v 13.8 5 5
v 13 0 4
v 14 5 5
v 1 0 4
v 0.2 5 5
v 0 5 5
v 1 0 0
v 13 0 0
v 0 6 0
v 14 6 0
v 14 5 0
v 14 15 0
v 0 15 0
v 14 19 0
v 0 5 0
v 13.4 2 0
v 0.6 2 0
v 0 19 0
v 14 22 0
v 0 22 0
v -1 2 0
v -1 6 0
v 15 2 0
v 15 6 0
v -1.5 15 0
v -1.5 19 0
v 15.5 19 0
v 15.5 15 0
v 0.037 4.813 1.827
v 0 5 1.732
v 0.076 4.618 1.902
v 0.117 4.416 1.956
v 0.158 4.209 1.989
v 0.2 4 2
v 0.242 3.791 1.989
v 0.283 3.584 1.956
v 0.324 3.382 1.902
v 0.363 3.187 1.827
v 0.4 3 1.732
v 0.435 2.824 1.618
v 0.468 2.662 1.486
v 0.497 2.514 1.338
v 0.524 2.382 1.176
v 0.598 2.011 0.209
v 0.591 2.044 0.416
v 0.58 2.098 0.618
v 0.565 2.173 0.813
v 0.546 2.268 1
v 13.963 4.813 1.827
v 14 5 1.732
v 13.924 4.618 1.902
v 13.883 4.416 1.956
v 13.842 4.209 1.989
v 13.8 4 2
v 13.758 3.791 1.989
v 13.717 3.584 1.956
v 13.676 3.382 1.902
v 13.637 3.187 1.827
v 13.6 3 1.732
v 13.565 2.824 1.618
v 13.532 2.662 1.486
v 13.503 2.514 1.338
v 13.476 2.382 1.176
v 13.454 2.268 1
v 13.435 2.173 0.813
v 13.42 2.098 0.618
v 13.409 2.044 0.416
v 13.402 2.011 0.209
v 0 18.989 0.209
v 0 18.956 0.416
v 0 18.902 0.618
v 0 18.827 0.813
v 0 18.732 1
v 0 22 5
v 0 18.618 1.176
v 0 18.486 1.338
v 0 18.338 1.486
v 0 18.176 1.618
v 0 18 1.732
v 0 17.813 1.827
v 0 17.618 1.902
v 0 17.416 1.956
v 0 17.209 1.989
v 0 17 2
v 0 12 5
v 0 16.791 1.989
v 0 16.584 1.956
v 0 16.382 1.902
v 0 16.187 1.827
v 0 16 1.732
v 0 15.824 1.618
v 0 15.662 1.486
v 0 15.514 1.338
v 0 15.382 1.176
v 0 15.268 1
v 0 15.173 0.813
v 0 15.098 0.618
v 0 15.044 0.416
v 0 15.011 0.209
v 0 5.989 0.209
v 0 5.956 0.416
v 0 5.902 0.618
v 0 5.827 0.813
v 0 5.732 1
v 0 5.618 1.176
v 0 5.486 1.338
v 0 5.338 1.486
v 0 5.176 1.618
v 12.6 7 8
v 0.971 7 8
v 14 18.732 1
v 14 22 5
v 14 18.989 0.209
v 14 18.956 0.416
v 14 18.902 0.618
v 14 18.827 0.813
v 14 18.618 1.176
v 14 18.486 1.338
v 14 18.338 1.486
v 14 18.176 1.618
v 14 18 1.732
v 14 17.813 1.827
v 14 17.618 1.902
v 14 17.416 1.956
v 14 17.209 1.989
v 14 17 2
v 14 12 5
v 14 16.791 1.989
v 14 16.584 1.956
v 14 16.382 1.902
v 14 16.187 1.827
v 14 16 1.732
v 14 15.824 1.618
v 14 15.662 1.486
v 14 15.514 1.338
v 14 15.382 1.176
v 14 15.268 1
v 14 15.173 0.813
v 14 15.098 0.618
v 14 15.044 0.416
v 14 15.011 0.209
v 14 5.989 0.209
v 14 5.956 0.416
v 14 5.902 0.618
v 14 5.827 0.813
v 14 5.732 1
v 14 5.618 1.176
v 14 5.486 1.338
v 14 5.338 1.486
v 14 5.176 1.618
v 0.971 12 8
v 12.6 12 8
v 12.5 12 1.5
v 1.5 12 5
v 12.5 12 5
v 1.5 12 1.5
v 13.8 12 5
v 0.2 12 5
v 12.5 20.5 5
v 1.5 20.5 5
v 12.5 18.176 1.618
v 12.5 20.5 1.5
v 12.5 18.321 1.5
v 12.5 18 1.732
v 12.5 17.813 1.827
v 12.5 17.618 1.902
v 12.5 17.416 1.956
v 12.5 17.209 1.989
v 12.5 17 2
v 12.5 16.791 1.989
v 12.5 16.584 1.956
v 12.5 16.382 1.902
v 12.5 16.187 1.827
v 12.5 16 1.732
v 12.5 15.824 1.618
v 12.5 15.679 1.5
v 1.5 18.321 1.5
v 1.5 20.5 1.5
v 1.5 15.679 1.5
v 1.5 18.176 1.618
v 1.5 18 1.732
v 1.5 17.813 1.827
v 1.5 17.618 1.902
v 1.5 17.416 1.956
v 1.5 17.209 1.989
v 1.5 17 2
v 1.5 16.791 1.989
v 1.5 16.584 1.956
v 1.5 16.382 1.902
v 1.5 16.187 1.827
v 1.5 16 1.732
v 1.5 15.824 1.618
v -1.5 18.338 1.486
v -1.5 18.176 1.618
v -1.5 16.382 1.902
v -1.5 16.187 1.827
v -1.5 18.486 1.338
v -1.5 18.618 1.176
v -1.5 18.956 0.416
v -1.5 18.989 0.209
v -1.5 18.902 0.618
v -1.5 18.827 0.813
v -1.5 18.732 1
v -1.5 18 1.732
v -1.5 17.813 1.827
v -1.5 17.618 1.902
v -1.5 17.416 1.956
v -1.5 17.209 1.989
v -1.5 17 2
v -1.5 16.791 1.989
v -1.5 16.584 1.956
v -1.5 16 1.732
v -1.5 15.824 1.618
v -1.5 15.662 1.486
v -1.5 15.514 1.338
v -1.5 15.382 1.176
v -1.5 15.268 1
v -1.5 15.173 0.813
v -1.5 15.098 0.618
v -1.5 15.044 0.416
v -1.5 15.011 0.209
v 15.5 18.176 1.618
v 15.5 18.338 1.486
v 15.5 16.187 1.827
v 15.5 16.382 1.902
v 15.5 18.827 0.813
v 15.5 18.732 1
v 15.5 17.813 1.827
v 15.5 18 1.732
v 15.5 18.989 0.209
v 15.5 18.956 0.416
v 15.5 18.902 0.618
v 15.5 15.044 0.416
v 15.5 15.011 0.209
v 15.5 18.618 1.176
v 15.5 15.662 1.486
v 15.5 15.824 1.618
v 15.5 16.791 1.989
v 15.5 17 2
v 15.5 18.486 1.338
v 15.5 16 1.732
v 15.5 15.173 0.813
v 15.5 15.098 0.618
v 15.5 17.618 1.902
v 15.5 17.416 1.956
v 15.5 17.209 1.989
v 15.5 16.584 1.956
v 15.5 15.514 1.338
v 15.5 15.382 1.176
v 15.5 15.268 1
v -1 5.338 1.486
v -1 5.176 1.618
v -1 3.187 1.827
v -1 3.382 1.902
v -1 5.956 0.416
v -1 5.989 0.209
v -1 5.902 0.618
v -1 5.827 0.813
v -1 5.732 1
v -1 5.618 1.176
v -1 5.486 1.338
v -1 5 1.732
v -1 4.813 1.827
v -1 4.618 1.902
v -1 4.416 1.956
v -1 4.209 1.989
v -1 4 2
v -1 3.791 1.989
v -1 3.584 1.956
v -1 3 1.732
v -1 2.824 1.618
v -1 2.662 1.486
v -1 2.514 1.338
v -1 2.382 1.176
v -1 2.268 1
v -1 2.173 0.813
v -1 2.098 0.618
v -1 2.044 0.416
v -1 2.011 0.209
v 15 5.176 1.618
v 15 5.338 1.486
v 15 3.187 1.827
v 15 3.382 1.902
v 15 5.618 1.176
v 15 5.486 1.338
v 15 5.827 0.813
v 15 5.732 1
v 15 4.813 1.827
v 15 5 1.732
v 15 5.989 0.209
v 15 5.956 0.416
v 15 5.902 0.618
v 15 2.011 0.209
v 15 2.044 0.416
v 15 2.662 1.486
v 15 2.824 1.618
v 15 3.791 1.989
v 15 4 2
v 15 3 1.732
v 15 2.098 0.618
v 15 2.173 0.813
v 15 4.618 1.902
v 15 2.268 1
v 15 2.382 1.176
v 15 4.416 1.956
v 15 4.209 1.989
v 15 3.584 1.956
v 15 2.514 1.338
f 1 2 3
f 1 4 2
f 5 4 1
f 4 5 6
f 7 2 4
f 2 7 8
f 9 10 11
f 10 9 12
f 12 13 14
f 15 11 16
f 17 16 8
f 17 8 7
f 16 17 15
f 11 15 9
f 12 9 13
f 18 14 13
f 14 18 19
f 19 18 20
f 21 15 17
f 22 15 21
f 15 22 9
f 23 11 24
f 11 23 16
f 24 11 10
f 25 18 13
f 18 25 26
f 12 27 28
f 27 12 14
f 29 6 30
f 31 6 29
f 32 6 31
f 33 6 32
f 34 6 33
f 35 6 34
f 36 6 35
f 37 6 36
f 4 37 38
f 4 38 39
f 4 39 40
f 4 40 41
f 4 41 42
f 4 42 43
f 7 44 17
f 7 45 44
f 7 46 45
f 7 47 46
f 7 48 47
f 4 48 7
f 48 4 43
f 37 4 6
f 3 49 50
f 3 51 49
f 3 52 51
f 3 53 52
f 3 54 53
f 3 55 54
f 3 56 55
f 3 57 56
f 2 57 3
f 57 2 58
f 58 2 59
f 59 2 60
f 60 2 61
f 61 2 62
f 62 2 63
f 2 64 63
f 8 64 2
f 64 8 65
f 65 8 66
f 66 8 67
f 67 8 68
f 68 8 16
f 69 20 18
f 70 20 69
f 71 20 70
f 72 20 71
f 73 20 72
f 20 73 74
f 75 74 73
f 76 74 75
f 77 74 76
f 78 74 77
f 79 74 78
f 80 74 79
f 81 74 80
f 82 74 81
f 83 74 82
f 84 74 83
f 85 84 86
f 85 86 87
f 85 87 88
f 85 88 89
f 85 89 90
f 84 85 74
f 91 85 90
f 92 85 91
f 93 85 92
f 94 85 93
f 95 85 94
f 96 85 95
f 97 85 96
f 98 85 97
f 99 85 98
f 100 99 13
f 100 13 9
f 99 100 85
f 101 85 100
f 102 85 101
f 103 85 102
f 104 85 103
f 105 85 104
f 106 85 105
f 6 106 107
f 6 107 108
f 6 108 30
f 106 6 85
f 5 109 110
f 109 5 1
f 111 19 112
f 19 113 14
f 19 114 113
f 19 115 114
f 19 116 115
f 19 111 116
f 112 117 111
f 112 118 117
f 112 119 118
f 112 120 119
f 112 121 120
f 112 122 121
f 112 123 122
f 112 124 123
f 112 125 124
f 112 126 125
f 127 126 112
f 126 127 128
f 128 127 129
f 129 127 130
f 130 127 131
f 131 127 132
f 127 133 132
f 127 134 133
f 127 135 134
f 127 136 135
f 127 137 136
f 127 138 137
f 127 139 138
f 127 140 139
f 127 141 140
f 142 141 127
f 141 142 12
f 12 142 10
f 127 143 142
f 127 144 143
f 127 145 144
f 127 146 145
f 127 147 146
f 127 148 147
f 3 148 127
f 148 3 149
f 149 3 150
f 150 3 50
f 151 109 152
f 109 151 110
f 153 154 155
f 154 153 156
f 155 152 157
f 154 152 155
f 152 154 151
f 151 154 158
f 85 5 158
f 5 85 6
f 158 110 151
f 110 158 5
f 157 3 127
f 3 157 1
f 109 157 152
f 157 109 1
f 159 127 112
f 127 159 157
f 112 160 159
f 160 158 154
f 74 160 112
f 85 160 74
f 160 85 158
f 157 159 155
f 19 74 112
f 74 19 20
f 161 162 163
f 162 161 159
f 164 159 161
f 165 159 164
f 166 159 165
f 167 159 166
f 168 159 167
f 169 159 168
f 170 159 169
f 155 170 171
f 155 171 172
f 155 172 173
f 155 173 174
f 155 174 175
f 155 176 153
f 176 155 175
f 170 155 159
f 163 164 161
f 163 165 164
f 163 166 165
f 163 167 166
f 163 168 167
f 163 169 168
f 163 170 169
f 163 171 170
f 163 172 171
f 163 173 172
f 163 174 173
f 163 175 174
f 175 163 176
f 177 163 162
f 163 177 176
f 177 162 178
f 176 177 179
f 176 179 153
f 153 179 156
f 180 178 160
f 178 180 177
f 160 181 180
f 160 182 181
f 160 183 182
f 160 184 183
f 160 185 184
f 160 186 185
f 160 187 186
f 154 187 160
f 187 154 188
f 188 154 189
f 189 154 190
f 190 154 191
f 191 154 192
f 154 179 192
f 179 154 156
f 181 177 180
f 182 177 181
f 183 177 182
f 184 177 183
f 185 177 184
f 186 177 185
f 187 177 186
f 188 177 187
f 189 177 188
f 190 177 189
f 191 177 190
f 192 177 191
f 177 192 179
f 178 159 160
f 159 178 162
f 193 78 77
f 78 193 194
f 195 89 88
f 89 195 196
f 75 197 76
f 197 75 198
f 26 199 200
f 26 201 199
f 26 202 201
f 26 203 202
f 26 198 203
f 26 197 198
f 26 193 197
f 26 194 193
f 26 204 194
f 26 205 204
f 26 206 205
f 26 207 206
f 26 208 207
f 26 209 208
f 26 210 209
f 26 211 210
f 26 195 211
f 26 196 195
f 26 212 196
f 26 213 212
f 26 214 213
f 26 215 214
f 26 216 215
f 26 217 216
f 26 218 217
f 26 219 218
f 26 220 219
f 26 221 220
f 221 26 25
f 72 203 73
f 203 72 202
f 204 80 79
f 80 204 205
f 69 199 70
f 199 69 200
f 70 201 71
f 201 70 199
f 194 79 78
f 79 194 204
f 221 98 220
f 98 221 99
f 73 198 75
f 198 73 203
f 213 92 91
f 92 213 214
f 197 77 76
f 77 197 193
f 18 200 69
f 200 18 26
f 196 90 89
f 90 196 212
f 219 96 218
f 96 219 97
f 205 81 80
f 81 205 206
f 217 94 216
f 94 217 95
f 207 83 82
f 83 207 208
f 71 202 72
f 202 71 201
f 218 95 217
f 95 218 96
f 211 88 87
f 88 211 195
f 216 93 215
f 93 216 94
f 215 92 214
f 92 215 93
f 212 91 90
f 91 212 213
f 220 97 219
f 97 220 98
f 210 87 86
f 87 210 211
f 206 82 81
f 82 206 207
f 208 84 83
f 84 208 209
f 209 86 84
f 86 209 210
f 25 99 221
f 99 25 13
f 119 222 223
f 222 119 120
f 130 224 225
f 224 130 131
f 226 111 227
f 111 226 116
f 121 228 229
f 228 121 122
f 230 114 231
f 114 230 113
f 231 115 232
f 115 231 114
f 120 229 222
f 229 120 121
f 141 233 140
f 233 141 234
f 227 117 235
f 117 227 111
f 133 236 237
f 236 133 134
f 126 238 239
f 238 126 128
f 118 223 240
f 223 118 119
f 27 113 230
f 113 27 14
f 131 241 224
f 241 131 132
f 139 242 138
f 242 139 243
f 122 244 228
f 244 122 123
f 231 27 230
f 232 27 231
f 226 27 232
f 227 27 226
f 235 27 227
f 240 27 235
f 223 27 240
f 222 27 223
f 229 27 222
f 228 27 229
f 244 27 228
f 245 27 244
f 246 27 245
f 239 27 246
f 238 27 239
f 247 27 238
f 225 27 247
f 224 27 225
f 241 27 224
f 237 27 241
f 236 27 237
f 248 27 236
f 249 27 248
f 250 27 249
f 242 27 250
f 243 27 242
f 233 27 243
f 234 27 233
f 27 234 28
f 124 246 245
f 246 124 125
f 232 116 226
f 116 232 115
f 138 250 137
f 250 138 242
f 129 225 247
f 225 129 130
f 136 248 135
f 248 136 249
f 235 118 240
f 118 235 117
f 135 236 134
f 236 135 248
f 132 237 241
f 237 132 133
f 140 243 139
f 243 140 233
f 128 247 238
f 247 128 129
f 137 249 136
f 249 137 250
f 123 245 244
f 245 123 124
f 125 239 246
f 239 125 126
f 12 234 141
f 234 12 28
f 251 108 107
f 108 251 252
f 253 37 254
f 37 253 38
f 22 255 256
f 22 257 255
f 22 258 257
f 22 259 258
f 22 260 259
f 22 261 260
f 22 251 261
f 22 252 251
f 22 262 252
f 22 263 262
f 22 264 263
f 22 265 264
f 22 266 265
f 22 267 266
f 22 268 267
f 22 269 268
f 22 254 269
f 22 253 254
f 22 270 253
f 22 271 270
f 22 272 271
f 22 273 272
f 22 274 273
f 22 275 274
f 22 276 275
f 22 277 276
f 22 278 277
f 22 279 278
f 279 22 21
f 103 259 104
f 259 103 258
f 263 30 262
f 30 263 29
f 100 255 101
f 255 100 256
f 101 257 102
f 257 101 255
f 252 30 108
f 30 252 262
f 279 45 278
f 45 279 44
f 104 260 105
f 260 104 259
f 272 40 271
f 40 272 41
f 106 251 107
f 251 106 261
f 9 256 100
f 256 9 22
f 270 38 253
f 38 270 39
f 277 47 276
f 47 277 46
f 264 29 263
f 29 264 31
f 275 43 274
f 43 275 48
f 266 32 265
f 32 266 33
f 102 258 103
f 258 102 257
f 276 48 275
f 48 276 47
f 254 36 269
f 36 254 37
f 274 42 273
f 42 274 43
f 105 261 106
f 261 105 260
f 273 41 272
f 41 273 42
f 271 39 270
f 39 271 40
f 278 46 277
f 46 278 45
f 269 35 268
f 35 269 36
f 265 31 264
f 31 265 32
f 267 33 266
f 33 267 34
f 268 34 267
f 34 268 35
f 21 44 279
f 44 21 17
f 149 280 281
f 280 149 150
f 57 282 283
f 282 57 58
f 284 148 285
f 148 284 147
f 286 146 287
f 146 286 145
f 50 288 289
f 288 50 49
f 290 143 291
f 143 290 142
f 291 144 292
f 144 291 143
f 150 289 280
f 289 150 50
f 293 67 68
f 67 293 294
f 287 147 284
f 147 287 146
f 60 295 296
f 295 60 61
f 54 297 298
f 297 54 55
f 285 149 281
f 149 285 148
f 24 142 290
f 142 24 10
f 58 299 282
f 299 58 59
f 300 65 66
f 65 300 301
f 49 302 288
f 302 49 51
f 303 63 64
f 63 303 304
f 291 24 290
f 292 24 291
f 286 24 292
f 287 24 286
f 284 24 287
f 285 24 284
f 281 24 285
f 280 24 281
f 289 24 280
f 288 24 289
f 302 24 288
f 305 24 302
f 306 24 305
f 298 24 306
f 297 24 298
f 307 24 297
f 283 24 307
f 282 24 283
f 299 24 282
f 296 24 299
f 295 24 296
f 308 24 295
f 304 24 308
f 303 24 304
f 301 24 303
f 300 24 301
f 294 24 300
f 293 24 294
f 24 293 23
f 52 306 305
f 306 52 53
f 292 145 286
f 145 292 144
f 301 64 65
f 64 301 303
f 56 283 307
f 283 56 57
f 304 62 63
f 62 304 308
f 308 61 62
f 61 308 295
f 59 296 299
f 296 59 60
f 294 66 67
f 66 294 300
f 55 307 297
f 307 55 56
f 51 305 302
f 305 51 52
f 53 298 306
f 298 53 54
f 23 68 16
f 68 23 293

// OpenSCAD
HoodPoints = [
  [  1,  0,  0 ],  //0
  [ 13,  0,  0 ],  //1
  [ 14,  5,  0 ],  //2
  [  0,  5,  0 ],  //3
  [  1,  0,  4 ],  //4
  [ 13,  0,  4 ],  //5
  [ 14,  5,  5 ],  //6
  [  0,  5,  5 ]]; //7
  
HoodFaces = [
  [0,1,2,3],  // bottom
  [4,5,1,0],  // front
  [7,6,5,4],  // top
  [5,6,2,1],  // right
  [6,7,3,2],  // back
  [7,4,0,3]]; // left
  
CabPoints = [
  [  0,  5,  0 ],  //0
  [ 14,  5,  0 ],  //1
  [ 14,  7,  0 ],  //2
  [  0,  7,  0 ],  //3
  [  0,  5,  5 ],  //4
  [ 14,  5,  5 ],  //5
  [ 14,  7,  8 ],  //6
  [  0,  7,  8 ]]; //7
  
CabFaces = [
  [0,1,2,3],  // bottom
  [4,5,1,0],  // front
  [7,6,5,4],  // top
  [5,6,2,1],  // right
  [6,7,3,2],  // back
  [7,4,0,3]]; // left
  
CabSidePoints = [
  [ -1,  5,  5 ],  //0
  [ .2,  5,  5 ],  //1
  [ .2,  12,  5 ],  //2
  [  -1,  12,  5 ],  //3
  [  -1,  5,  12 ],  //4
  [ 2,  5,  12 ],  //5
  [ 2,  12,  12 ],  //6
  [ -1,  12,  12 ]]; //7
  
CabLeftSidePoints = [
  [ 15,  5,  5 ],  //0
  [ 13.8,  5,  5 ],  //1
  [ 13.8,  12,  5 ],  //2
  [  15,  12,  5 ],  //3
  [  15,  5,  12 ],  //4
  [ 11,  5,  12 ],  //5
  [ 11,  12,  12 ],  //6
  [ 15,  12,  12 ]]; //7
  
CabSideFaces = [
  [0,1,2,3],  // bottom
  [4,5,1,0],  // front
  [7,6,5,4],  // top
  [5,6,2,1],  // right
  [6,7,3,2],  // back
  [7,4,0,3]]; // left



module truckCab() {
    polyhedron( HoodPoints, HoodFaces );
    polyhedron(CabPoints, CabFaces);
    translate([0, 7, 0]) cube([14,5,8]);
}

difference() {
    truckCab();
    polyhedron(CabSidePoints, CabSideFaces);
    polyhedron(CabLeftSidePoints, CabSideFaces);
}

difference() {
    translate([0, 12, 0]) cube([14,10,5]);
    translate([1.5, 12, 1.5]) cube([11,8.5,5]);
}

$fn = 60;
module wheels() {
    translate([-1.5, 17, 0]) rotate([0,90,0]) cylinder(r=2, h=3);
    translate([12.5, 17, 0]) rotate([0,90,0]) cylinder(r=2, h=3);

    translate([-1, 4, 0]) rotate([0,90,0]) cylinder(r=2, h=3);
    translate([12, 4, 0]) rotate([0,90,0]) cylinder(r=2, h=3);
}

difference() {
    wheels();
    translate([-4,0,-10]) cube([20,20,10]);
}
